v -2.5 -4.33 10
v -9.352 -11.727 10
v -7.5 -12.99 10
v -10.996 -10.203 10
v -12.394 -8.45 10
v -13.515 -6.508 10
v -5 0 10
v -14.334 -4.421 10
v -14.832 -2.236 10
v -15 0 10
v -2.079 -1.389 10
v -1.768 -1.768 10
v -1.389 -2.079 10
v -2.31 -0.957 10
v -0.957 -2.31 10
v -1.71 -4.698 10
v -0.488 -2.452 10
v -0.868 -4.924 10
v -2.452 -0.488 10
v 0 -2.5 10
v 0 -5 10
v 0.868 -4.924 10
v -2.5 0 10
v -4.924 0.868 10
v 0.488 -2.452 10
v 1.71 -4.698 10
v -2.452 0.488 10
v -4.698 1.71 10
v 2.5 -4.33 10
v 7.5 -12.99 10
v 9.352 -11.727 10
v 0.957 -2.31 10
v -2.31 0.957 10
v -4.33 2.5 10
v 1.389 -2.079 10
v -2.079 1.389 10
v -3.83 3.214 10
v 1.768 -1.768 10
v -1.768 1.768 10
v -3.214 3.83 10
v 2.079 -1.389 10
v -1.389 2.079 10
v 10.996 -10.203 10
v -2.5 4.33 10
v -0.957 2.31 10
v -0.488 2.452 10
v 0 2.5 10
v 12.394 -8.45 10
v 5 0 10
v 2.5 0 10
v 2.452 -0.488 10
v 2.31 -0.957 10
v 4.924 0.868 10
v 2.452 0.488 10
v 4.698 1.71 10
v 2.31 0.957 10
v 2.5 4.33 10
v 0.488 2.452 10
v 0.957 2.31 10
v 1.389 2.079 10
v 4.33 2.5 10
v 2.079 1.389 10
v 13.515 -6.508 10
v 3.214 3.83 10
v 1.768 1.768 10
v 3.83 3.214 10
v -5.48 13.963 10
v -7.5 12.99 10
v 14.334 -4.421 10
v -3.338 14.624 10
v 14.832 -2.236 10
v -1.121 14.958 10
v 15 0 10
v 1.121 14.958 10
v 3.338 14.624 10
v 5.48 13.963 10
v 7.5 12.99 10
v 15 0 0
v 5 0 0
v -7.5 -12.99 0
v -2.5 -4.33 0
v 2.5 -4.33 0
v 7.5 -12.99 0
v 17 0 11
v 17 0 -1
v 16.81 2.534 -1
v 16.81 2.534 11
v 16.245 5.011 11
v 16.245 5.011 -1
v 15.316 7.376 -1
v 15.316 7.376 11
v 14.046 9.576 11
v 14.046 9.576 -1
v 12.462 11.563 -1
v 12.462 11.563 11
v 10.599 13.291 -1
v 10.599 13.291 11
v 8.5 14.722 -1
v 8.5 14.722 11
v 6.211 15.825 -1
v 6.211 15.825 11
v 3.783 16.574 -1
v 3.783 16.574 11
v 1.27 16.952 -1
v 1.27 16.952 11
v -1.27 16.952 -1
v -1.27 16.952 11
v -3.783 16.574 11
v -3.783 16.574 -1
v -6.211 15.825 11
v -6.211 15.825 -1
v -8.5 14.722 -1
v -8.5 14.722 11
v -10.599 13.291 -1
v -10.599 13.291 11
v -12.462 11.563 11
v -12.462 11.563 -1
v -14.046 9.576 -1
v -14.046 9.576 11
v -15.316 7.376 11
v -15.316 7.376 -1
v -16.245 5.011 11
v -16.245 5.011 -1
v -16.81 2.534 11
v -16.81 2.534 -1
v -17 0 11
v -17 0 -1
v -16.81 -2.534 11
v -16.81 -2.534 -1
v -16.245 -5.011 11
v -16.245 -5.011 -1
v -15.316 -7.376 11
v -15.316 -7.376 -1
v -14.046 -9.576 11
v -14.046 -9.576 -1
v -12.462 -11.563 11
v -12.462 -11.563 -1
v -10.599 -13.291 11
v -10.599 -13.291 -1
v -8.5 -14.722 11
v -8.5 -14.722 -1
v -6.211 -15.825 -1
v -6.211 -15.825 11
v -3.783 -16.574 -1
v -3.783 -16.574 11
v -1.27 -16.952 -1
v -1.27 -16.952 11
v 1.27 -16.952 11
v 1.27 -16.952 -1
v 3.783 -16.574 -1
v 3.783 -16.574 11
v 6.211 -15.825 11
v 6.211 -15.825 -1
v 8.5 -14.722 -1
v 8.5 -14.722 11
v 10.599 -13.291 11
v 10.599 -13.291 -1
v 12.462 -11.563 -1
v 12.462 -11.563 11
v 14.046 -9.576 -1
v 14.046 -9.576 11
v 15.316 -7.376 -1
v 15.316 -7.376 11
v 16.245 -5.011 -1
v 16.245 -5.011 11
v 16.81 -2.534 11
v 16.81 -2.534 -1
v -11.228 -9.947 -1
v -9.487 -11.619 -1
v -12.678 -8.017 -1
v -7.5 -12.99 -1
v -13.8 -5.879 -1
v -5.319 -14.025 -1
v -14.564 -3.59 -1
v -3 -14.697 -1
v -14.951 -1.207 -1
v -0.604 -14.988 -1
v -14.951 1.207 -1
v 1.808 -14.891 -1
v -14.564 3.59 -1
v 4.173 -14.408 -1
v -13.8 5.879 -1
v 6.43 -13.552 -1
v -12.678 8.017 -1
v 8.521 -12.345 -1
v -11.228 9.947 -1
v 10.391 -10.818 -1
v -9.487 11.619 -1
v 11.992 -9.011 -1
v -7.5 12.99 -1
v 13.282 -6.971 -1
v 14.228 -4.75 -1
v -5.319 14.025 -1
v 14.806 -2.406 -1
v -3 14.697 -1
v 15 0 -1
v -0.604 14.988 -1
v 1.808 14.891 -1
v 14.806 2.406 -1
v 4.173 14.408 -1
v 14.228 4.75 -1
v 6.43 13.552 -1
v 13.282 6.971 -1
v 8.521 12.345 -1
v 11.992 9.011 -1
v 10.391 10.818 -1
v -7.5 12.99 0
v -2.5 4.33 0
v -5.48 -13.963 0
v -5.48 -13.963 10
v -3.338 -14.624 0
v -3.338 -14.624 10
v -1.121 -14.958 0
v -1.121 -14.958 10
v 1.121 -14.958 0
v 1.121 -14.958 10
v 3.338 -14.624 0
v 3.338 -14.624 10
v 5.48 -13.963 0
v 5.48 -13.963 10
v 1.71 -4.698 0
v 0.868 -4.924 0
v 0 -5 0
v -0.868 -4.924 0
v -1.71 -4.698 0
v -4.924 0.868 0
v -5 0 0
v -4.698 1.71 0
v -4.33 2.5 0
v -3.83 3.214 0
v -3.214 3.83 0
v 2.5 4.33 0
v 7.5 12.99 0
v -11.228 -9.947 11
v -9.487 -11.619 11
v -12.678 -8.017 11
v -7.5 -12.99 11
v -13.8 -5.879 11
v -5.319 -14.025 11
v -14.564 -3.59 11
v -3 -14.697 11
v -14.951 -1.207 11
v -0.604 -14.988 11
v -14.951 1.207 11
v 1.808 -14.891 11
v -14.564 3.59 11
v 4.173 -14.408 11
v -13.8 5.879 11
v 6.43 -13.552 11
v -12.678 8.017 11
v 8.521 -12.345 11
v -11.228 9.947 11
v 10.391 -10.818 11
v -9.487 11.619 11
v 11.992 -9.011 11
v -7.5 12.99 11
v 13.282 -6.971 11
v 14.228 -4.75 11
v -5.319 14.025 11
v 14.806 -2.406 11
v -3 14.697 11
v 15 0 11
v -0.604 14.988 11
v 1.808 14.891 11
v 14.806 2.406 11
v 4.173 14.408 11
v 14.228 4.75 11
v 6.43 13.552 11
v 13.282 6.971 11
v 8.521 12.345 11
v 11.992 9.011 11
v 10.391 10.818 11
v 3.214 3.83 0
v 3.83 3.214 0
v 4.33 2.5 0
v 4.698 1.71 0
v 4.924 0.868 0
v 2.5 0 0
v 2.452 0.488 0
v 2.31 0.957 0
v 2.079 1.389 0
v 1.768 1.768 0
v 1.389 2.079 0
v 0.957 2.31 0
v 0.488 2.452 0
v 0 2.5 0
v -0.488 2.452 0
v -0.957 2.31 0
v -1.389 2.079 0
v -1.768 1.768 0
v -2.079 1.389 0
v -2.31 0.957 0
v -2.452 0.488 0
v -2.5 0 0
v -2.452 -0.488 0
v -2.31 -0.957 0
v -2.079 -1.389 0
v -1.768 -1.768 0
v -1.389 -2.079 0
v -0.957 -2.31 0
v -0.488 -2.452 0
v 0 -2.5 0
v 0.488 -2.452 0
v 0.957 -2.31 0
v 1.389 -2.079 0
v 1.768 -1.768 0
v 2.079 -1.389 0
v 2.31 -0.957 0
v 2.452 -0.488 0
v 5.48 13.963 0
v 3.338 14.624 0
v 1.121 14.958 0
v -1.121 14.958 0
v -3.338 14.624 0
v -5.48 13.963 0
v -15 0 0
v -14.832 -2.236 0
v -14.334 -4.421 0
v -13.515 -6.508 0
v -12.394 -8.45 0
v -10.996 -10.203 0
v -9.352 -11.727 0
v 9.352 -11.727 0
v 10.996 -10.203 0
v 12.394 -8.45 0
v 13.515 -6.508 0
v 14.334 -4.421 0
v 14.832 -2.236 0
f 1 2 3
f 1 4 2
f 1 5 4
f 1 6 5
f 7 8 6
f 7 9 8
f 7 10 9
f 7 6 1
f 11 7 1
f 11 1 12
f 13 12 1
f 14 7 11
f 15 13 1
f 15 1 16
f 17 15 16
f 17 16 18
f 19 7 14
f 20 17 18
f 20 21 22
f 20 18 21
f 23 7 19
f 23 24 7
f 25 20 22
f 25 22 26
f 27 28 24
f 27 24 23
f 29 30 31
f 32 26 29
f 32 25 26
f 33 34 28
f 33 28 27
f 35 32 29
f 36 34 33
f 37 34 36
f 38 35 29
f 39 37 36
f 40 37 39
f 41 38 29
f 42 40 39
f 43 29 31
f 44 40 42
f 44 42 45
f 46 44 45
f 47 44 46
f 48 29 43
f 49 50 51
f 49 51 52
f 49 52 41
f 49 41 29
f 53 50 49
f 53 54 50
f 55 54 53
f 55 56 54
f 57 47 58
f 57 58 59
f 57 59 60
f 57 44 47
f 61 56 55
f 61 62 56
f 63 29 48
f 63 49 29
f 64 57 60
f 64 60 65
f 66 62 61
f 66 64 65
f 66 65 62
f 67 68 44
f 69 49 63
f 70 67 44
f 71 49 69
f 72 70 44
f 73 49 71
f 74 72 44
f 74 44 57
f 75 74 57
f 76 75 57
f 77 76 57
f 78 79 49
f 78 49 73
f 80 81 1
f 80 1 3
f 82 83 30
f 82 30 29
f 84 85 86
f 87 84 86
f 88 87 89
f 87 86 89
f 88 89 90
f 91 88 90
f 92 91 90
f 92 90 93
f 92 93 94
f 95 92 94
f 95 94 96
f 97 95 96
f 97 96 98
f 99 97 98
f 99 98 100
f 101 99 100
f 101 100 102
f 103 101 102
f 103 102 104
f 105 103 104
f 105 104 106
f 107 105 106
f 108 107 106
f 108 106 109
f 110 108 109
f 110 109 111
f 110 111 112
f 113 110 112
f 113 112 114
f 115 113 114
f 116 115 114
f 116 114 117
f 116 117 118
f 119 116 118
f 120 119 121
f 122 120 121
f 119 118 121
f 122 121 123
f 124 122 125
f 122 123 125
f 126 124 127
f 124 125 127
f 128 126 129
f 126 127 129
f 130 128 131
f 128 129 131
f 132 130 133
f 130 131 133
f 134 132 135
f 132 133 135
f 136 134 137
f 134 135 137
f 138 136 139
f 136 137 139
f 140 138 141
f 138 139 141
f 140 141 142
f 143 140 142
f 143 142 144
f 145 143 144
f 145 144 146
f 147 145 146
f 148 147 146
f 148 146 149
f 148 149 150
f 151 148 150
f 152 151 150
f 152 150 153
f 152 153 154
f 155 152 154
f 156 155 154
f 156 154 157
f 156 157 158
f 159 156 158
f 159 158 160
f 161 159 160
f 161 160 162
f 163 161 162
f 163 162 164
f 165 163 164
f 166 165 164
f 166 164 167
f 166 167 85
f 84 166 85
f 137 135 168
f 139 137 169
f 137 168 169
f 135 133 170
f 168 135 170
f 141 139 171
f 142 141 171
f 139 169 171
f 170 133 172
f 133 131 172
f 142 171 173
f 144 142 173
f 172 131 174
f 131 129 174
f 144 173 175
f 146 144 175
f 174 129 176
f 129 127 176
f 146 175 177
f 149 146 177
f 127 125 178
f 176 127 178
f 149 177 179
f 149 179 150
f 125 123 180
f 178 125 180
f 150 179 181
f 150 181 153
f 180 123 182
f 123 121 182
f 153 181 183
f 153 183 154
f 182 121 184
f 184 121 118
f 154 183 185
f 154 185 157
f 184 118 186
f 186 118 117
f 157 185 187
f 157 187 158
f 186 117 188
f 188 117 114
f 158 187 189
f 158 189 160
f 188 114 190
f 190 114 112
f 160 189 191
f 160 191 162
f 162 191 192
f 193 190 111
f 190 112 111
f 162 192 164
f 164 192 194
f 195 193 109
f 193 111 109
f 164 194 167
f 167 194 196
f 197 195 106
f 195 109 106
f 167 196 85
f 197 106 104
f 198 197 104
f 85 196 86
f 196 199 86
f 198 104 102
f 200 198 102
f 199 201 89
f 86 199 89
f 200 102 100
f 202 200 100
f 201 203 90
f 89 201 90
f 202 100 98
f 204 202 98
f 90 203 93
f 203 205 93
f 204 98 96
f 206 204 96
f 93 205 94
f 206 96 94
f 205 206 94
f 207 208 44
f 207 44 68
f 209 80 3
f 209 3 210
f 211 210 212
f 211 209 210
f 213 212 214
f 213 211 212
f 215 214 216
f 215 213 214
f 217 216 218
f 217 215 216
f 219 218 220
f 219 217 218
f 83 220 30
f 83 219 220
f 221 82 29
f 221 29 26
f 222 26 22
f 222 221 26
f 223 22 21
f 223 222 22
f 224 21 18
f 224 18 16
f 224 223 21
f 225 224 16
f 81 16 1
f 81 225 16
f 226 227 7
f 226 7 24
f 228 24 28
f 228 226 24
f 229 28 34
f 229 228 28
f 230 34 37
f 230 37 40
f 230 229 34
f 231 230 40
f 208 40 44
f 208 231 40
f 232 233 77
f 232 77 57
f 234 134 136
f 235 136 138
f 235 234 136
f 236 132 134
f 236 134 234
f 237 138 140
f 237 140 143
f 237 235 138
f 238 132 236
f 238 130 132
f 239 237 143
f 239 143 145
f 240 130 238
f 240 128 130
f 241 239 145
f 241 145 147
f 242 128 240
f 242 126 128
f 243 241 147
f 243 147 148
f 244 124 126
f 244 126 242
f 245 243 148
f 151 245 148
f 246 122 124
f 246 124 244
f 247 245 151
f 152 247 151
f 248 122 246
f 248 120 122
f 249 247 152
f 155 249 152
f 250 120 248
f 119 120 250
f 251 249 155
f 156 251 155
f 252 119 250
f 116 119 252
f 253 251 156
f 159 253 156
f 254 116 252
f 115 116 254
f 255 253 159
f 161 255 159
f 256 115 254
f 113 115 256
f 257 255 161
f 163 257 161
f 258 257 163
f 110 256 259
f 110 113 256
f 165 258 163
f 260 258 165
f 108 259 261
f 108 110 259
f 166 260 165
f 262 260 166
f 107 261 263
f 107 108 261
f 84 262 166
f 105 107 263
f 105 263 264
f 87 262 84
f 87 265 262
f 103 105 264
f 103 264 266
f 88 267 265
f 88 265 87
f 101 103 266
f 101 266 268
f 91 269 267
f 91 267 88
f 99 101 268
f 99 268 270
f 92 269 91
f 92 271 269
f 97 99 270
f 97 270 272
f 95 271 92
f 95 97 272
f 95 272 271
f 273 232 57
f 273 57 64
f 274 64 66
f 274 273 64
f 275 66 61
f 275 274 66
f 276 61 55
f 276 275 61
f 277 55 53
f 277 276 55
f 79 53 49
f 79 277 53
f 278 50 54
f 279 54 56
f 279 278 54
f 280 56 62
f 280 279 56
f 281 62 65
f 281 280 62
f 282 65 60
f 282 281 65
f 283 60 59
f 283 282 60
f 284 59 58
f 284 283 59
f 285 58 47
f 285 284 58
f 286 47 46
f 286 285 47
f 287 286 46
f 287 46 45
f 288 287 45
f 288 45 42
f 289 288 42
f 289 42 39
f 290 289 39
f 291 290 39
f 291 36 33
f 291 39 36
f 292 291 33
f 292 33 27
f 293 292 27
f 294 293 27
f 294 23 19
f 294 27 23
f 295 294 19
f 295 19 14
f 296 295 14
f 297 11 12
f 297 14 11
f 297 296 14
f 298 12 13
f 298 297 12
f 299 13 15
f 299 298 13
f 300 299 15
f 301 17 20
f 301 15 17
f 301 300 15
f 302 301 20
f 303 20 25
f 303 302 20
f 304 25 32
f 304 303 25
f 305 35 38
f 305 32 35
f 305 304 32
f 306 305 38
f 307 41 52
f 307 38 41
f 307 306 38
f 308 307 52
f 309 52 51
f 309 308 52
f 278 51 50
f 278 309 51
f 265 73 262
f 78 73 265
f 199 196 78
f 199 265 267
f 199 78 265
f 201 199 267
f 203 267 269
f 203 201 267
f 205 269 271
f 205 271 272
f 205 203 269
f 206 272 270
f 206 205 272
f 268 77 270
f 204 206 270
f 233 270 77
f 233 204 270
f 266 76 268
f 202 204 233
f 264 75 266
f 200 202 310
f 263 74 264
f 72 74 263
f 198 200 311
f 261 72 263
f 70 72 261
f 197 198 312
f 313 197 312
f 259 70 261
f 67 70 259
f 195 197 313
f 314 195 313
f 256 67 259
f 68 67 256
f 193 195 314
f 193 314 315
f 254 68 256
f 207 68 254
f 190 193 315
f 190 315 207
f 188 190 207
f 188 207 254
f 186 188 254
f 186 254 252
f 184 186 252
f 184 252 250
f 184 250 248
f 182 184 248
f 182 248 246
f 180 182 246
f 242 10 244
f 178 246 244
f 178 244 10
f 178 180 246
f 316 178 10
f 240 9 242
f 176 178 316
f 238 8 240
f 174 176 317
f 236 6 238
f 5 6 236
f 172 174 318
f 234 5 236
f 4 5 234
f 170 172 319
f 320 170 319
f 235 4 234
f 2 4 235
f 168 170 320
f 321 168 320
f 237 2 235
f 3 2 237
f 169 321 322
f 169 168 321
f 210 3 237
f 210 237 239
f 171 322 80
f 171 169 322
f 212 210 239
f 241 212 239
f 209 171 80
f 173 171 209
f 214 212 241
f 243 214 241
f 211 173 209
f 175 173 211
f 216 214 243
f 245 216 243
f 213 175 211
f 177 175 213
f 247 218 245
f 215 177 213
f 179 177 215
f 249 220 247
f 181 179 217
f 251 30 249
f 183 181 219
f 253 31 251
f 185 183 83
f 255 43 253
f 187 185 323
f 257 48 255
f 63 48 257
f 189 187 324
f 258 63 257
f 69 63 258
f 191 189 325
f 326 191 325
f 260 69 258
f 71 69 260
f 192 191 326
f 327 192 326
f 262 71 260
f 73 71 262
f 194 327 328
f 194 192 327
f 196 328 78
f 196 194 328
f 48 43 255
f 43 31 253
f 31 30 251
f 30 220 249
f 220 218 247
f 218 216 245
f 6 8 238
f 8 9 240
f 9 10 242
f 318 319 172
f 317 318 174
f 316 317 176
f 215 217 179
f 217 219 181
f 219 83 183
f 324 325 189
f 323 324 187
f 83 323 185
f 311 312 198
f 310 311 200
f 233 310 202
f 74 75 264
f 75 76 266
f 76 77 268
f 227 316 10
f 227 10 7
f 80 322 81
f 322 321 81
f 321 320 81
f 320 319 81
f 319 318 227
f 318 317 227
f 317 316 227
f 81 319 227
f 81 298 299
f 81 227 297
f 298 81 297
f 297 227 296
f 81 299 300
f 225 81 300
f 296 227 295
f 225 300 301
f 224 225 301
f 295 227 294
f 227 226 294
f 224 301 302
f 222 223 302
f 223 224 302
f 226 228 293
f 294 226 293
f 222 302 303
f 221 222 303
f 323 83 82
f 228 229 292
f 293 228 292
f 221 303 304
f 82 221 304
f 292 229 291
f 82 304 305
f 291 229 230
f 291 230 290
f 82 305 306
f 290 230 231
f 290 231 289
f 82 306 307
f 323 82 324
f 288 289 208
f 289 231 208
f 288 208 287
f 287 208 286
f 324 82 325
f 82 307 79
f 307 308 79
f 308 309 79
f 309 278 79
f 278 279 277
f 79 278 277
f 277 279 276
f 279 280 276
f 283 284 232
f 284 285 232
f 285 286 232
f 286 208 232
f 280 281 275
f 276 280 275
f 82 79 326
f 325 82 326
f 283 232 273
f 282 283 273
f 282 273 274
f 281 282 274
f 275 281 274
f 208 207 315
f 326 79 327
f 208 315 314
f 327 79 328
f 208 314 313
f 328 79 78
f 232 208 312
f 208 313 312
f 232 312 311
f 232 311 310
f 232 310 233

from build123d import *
from build123d.topology import SkipClean

# Parameters (mm, degrees)
SKETCH1_R                = 17
BOSS_EXTRUDE1_DEPTH      = 10
CUT_EXTRUDE2_REACH       = 28.038
BOSS_EXTRUDE2_DEPTH      = 11
BOSS_EXTRUDE2_DEPTH_BACK = 1
SKETCH1_6_R              = 17
CUT_EXTRUDE3_REACH       = 28.439
SKETCH1_7_R              = 2.5


with BuildPart() as part:
    # Sketch1 → Boss-Extrude1 (new body)
    with BuildSketch(Plane.XY):
        Circle(SKETCH1_R)
    extrude(amount=BOSS_EXTRUDE1_DEPTH)

    # Sketch1<5> → Cut-Extrude2 (cut, up to next)
    with BuildSketch(Plane.XY, mode=Mode.PRIVATE) as cut_extrude2_sk1:
        with BuildLine():
            Line((7.5, 12.990381057), (2.5, 4.330127019))
            ThreePointArc((2.5, 4.330127019), (4.330127019, 2.5), (5, 0))
            Line((5, 0), (15, 0))
            ThreePointArc((15, 0), (12.990381057, 7.5), (7.5, 12.990381057))
        make_face()
    cut_extrude2_tool1 = extrude(cut_extrude2_sk1.sketch, amount=CUT_EXTRUDE2_REACH, mode=Mode.PRIVATE) & part.part
    # Sketch1<5> → Cut-Extrude2 (cut, up to next)
    with BuildSketch(Plane.XY, mode=Mode.PRIVATE) as cut_extrude2_sk2:
        with BuildLine():
            ThreePointArc((-5, 0), (-4.330127019, 2.5), (-2.5, 4.330127019))
            Line((-2.5, 4.330127019), (-7.5, 12.990381057))
            ThreePointArc((-7.5, 12.990381057), (-12.990381057, 7.5), (-15, 0))
            Line((-15, 0), (-5, 0))
        make_face()
    cut_extrude2_tool2 = extrude(cut_extrude2_sk2.sketch, amount=CUT_EXTRUDE2_REACH, mode=Mode.PRIVATE) & part.part
    # Sketch1<5> → Cut-Extrude2 (cut, up to next)
    with BuildSketch(Plane.XY, mode=Mode.PRIVATE) as cut_extrude2_sk3:
        with BuildLine():
            Line((7.5, -12.990381057), (2.5, -4.330127019))
            ThreePointArc((2.5, -4.330127019), (0, -5), (-2.5, -4.330127019))
            Line((-2.5, -4.330127019), (-7.5, -12.990381057))
            ThreePointArc((-7.5, -12.990381057), (0, -15), (7.5, -12.990381057))
        make_face()
    cut_extrude2_tool3 = extrude(cut_extrude2_sk3.sketch, amount=CUT_EXTRUDE2_REACH, mode=Mode.PRIVATE) & part.part
    add(cut_extrude2_tool1.solids().sort_by_distance((8.959095, 5.172536, 0))[0], mode=Mode.SUBTRACT)
    add(cut_extrude2_tool2.solids().sort_by_distance((-8.959095, 5.172536, 0))[0], mode=Mode.SUBTRACT)
    add(cut_extrude2_tool3.solids().sort_by_distance((0, -10.345071, 0))[0], mode=Mode.SUBTRACT)

    # Sketch1<6> → Boss-Extrude2 (add, two sides: drawn at the far end of the back side and taken through both)
    with SkipClean():  # the faces are left unmerged after this step: merging them gives an invalid solid
        with BuildSketch(Plane.XY.offset(-BOSS_EXTRUDE2_DEPTH_BACK)):
            Circle(SKETCH1_6_R)
            with BuildLine():
                ThreePointArc((-7.5, 12.990381057), (0, 15), (7.5, 12.990381057))
                ThreePointArc((7.5, 12.990381057), (12.990381057, 7.5), (15, 0))
                ThreePointArc((15, 0), (12.990381057, -7.5), (7.5, -12.990381057))
                ThreePointArc((7.5, -12.990381057), (0, -15), (-7.5, -12.990381057))
                ThreePointArc((-7.5, -12.990381057), (-12.990381057, -7.5), (-15, 0))
                ThreePointArc((-15, 0), (-12.990381057, 7.5), (-7.5, 12.990381057))
            make_face(mode=Mode.SUBTRACT)
        extrude(amount=BOSS_EXTRUDE2_DEPTH + BOSS_EXTRUDE2_DEPTH_BACK)

    # Sketch1<7> → Cut-Extrude3 (cut, up to next)
    with BuildSketch(Plane.XY, mode=Mode.PRIVATE) as cut_extrude3_sk1:
        Circle(SKETCH1_7_R)
    cut_extrude3_tool1 = extrude(cut_extrude3_sk1.sketch, amount=CUT_EXTRUDE3_REACH, mode=Mode.PRIVATE) & part.part
    add(cut_extrude3_tool1.solids().sort_by_distance((0, 0, 0))[0], mode=Mode.SUBTRACT)


solid = part.part
